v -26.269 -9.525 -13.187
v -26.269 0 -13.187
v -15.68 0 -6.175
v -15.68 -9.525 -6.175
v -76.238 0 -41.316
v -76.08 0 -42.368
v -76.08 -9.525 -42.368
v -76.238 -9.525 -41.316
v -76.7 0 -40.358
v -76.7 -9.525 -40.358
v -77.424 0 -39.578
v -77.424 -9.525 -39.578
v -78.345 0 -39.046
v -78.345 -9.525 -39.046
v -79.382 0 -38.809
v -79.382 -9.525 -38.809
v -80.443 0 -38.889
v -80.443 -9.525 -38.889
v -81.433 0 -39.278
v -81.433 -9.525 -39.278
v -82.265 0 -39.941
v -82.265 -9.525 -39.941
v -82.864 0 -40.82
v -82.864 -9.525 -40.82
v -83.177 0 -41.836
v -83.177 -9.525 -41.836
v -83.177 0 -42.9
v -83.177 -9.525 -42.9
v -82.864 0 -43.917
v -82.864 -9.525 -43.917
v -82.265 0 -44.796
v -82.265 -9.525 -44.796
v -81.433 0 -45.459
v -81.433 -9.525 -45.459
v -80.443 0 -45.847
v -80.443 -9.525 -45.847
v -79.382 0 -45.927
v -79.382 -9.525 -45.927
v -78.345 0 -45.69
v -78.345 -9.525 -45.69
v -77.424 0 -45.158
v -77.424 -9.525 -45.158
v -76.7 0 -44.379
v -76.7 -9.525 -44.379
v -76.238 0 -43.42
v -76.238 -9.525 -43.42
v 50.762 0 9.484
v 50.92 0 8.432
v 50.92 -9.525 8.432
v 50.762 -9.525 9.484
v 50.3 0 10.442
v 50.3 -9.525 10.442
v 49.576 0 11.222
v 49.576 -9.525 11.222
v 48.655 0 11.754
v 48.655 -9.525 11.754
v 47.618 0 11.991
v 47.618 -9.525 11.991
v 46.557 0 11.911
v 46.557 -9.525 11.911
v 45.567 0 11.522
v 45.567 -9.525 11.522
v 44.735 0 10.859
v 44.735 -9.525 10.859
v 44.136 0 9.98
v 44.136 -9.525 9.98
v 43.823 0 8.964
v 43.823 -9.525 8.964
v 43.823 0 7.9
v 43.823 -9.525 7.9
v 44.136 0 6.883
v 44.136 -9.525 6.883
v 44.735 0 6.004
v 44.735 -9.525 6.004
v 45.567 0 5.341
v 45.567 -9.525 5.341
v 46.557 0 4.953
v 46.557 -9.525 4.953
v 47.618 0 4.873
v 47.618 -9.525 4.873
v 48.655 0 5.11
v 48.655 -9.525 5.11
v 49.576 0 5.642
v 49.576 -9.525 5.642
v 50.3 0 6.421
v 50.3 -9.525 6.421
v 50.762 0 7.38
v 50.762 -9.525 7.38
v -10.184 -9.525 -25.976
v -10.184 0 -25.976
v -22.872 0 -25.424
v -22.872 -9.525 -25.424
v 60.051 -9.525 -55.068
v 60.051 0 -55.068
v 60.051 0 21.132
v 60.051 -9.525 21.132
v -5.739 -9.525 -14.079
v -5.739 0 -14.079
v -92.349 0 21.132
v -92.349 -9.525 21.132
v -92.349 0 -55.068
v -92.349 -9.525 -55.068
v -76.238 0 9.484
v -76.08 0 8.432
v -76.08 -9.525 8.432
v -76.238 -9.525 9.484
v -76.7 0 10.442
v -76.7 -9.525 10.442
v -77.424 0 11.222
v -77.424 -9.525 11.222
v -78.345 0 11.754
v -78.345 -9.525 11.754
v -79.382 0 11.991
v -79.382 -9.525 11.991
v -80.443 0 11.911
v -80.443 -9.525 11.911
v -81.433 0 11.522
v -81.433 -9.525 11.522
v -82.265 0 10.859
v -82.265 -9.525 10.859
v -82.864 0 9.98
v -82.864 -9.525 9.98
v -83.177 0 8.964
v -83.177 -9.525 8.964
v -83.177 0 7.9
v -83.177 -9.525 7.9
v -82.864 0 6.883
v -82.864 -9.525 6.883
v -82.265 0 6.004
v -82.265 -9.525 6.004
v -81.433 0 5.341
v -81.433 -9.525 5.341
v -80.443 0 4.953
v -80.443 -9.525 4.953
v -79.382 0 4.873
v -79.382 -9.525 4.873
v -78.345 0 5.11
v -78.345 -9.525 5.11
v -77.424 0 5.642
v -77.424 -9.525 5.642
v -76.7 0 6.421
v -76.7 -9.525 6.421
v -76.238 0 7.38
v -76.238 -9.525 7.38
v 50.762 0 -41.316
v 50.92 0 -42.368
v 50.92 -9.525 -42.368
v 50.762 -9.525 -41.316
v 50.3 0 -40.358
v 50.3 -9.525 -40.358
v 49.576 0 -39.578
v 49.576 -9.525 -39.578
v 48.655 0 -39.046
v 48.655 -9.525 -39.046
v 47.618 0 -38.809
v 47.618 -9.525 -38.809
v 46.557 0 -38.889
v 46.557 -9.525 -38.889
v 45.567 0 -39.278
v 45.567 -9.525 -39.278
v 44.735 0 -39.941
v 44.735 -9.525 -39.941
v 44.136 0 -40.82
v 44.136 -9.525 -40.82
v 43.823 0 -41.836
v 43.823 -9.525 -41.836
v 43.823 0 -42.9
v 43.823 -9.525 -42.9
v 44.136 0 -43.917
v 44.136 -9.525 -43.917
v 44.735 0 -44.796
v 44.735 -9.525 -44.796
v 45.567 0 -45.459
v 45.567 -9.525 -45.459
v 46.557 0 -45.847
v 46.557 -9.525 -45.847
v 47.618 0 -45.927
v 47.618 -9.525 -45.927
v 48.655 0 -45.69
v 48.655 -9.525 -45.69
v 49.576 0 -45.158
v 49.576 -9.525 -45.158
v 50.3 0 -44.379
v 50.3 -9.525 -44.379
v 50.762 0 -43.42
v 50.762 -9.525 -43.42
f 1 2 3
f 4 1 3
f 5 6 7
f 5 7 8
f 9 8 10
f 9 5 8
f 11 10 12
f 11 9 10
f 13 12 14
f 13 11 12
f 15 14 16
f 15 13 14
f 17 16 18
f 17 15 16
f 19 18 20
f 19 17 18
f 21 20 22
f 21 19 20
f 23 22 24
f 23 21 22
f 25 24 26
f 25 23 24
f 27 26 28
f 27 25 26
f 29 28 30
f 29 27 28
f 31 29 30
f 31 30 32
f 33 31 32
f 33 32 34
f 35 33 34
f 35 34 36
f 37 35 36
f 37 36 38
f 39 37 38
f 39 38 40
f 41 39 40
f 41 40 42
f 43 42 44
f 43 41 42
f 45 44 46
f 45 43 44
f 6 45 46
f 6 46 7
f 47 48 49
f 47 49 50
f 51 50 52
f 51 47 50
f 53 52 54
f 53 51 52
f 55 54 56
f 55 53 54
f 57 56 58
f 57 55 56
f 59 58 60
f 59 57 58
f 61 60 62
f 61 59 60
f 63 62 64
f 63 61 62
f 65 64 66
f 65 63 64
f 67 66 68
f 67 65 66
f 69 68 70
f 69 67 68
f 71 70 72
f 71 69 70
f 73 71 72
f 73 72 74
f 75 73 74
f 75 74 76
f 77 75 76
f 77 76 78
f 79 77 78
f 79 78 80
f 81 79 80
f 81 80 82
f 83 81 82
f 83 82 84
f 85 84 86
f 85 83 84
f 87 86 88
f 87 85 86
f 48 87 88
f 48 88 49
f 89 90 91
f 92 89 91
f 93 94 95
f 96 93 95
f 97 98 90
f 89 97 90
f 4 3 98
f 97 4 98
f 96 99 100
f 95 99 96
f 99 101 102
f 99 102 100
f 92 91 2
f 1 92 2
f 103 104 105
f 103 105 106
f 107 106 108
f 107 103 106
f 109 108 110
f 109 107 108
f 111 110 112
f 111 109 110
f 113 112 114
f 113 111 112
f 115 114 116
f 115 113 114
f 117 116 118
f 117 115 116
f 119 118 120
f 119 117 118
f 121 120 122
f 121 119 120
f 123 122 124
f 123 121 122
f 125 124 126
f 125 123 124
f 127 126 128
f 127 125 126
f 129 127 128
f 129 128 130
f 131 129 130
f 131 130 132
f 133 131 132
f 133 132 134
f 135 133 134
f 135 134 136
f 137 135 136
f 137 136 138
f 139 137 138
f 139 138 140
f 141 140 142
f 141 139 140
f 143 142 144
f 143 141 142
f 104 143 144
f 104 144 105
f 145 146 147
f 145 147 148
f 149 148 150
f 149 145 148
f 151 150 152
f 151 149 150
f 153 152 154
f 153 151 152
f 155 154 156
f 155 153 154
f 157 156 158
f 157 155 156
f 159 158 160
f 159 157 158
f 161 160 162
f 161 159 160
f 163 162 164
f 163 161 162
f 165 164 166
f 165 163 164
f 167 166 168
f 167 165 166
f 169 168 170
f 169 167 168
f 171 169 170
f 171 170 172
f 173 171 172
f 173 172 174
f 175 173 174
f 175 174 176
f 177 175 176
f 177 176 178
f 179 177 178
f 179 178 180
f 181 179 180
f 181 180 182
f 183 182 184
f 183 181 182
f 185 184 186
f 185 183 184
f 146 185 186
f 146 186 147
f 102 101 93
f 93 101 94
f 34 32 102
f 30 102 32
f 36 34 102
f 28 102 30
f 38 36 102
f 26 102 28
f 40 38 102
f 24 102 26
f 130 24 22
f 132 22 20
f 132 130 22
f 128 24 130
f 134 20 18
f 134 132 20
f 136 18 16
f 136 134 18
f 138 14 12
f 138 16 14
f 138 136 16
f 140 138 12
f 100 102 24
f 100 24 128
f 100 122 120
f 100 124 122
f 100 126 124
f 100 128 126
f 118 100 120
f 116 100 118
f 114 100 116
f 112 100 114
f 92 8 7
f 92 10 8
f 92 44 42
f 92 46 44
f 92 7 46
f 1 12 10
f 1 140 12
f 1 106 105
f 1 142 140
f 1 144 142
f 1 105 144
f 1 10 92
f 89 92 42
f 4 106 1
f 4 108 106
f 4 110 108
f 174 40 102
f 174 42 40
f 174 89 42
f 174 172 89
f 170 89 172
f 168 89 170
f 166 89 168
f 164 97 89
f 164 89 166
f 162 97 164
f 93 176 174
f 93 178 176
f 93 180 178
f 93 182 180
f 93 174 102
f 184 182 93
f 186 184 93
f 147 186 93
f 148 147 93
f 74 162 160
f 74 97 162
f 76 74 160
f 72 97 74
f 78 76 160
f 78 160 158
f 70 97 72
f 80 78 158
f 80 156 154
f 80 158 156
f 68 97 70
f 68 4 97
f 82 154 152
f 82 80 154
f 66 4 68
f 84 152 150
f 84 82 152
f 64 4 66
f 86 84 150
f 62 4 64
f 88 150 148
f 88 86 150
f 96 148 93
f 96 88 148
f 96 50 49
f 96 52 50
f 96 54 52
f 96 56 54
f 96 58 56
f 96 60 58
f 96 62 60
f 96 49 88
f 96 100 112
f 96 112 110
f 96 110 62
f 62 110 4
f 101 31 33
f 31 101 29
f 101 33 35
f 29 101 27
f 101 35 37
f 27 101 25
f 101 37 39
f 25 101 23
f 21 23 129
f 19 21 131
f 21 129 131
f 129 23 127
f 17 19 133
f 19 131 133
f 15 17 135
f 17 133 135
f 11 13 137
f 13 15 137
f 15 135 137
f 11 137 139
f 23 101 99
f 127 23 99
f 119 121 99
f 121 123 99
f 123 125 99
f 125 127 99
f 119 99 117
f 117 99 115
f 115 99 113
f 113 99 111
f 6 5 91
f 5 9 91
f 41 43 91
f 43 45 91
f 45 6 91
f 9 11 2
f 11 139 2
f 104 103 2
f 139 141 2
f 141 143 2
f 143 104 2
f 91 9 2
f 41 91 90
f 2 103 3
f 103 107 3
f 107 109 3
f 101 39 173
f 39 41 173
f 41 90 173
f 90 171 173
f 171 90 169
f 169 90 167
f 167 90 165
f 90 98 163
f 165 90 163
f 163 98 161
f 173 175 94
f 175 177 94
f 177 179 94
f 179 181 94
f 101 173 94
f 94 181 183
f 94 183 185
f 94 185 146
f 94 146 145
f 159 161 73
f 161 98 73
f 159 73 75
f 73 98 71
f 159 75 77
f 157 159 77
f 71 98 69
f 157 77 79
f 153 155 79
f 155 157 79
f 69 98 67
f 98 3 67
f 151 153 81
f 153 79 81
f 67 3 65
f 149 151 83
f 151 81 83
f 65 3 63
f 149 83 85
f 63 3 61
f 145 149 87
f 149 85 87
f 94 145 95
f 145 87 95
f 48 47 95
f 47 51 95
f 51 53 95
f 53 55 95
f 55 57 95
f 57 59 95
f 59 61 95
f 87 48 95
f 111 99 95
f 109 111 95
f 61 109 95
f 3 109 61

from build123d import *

# Parameters (mm, degrees)
F0_W     = 152.4
F0_H     = 76.2
F0_R     = 3.5687
F1_DEPTH = 9.525


with BuildPart() as f1:
    # F0 (on Front) → F1 (new body)
    with BuildSketch(Plane.XZ):
        with Locations((-16.148576, -16.968202)):
            Rectangle(F0_W, F0_H)
        with Locations((-79.648576, -42.368202)):
            Circle(F0_R, mode=Mode.SUBTRACT)
        with Locations((47.351424, -42.368202)):
            Circle(F0_R, mode=Mode.SUBTRACT)
        with Locations((-79.648576, 8.431798)):
            Circle(F0_R, mode=Mode.SUBTRACT)
        Polygon((-26.268572, -13.187168), (-15.679849, -6.17511), (-5.738891, -14.078739), (-10.183763, -25.975507), (-22.871804, -25.424486), align=None, mode=Mode.SUBTRACT)
        with Locations((47.351424, 8.431798)):
            Circle(F0_R, mode=Mode.SUBTRACT)
    extrude(amount=F1_DEPTH)


solid = f1.part
